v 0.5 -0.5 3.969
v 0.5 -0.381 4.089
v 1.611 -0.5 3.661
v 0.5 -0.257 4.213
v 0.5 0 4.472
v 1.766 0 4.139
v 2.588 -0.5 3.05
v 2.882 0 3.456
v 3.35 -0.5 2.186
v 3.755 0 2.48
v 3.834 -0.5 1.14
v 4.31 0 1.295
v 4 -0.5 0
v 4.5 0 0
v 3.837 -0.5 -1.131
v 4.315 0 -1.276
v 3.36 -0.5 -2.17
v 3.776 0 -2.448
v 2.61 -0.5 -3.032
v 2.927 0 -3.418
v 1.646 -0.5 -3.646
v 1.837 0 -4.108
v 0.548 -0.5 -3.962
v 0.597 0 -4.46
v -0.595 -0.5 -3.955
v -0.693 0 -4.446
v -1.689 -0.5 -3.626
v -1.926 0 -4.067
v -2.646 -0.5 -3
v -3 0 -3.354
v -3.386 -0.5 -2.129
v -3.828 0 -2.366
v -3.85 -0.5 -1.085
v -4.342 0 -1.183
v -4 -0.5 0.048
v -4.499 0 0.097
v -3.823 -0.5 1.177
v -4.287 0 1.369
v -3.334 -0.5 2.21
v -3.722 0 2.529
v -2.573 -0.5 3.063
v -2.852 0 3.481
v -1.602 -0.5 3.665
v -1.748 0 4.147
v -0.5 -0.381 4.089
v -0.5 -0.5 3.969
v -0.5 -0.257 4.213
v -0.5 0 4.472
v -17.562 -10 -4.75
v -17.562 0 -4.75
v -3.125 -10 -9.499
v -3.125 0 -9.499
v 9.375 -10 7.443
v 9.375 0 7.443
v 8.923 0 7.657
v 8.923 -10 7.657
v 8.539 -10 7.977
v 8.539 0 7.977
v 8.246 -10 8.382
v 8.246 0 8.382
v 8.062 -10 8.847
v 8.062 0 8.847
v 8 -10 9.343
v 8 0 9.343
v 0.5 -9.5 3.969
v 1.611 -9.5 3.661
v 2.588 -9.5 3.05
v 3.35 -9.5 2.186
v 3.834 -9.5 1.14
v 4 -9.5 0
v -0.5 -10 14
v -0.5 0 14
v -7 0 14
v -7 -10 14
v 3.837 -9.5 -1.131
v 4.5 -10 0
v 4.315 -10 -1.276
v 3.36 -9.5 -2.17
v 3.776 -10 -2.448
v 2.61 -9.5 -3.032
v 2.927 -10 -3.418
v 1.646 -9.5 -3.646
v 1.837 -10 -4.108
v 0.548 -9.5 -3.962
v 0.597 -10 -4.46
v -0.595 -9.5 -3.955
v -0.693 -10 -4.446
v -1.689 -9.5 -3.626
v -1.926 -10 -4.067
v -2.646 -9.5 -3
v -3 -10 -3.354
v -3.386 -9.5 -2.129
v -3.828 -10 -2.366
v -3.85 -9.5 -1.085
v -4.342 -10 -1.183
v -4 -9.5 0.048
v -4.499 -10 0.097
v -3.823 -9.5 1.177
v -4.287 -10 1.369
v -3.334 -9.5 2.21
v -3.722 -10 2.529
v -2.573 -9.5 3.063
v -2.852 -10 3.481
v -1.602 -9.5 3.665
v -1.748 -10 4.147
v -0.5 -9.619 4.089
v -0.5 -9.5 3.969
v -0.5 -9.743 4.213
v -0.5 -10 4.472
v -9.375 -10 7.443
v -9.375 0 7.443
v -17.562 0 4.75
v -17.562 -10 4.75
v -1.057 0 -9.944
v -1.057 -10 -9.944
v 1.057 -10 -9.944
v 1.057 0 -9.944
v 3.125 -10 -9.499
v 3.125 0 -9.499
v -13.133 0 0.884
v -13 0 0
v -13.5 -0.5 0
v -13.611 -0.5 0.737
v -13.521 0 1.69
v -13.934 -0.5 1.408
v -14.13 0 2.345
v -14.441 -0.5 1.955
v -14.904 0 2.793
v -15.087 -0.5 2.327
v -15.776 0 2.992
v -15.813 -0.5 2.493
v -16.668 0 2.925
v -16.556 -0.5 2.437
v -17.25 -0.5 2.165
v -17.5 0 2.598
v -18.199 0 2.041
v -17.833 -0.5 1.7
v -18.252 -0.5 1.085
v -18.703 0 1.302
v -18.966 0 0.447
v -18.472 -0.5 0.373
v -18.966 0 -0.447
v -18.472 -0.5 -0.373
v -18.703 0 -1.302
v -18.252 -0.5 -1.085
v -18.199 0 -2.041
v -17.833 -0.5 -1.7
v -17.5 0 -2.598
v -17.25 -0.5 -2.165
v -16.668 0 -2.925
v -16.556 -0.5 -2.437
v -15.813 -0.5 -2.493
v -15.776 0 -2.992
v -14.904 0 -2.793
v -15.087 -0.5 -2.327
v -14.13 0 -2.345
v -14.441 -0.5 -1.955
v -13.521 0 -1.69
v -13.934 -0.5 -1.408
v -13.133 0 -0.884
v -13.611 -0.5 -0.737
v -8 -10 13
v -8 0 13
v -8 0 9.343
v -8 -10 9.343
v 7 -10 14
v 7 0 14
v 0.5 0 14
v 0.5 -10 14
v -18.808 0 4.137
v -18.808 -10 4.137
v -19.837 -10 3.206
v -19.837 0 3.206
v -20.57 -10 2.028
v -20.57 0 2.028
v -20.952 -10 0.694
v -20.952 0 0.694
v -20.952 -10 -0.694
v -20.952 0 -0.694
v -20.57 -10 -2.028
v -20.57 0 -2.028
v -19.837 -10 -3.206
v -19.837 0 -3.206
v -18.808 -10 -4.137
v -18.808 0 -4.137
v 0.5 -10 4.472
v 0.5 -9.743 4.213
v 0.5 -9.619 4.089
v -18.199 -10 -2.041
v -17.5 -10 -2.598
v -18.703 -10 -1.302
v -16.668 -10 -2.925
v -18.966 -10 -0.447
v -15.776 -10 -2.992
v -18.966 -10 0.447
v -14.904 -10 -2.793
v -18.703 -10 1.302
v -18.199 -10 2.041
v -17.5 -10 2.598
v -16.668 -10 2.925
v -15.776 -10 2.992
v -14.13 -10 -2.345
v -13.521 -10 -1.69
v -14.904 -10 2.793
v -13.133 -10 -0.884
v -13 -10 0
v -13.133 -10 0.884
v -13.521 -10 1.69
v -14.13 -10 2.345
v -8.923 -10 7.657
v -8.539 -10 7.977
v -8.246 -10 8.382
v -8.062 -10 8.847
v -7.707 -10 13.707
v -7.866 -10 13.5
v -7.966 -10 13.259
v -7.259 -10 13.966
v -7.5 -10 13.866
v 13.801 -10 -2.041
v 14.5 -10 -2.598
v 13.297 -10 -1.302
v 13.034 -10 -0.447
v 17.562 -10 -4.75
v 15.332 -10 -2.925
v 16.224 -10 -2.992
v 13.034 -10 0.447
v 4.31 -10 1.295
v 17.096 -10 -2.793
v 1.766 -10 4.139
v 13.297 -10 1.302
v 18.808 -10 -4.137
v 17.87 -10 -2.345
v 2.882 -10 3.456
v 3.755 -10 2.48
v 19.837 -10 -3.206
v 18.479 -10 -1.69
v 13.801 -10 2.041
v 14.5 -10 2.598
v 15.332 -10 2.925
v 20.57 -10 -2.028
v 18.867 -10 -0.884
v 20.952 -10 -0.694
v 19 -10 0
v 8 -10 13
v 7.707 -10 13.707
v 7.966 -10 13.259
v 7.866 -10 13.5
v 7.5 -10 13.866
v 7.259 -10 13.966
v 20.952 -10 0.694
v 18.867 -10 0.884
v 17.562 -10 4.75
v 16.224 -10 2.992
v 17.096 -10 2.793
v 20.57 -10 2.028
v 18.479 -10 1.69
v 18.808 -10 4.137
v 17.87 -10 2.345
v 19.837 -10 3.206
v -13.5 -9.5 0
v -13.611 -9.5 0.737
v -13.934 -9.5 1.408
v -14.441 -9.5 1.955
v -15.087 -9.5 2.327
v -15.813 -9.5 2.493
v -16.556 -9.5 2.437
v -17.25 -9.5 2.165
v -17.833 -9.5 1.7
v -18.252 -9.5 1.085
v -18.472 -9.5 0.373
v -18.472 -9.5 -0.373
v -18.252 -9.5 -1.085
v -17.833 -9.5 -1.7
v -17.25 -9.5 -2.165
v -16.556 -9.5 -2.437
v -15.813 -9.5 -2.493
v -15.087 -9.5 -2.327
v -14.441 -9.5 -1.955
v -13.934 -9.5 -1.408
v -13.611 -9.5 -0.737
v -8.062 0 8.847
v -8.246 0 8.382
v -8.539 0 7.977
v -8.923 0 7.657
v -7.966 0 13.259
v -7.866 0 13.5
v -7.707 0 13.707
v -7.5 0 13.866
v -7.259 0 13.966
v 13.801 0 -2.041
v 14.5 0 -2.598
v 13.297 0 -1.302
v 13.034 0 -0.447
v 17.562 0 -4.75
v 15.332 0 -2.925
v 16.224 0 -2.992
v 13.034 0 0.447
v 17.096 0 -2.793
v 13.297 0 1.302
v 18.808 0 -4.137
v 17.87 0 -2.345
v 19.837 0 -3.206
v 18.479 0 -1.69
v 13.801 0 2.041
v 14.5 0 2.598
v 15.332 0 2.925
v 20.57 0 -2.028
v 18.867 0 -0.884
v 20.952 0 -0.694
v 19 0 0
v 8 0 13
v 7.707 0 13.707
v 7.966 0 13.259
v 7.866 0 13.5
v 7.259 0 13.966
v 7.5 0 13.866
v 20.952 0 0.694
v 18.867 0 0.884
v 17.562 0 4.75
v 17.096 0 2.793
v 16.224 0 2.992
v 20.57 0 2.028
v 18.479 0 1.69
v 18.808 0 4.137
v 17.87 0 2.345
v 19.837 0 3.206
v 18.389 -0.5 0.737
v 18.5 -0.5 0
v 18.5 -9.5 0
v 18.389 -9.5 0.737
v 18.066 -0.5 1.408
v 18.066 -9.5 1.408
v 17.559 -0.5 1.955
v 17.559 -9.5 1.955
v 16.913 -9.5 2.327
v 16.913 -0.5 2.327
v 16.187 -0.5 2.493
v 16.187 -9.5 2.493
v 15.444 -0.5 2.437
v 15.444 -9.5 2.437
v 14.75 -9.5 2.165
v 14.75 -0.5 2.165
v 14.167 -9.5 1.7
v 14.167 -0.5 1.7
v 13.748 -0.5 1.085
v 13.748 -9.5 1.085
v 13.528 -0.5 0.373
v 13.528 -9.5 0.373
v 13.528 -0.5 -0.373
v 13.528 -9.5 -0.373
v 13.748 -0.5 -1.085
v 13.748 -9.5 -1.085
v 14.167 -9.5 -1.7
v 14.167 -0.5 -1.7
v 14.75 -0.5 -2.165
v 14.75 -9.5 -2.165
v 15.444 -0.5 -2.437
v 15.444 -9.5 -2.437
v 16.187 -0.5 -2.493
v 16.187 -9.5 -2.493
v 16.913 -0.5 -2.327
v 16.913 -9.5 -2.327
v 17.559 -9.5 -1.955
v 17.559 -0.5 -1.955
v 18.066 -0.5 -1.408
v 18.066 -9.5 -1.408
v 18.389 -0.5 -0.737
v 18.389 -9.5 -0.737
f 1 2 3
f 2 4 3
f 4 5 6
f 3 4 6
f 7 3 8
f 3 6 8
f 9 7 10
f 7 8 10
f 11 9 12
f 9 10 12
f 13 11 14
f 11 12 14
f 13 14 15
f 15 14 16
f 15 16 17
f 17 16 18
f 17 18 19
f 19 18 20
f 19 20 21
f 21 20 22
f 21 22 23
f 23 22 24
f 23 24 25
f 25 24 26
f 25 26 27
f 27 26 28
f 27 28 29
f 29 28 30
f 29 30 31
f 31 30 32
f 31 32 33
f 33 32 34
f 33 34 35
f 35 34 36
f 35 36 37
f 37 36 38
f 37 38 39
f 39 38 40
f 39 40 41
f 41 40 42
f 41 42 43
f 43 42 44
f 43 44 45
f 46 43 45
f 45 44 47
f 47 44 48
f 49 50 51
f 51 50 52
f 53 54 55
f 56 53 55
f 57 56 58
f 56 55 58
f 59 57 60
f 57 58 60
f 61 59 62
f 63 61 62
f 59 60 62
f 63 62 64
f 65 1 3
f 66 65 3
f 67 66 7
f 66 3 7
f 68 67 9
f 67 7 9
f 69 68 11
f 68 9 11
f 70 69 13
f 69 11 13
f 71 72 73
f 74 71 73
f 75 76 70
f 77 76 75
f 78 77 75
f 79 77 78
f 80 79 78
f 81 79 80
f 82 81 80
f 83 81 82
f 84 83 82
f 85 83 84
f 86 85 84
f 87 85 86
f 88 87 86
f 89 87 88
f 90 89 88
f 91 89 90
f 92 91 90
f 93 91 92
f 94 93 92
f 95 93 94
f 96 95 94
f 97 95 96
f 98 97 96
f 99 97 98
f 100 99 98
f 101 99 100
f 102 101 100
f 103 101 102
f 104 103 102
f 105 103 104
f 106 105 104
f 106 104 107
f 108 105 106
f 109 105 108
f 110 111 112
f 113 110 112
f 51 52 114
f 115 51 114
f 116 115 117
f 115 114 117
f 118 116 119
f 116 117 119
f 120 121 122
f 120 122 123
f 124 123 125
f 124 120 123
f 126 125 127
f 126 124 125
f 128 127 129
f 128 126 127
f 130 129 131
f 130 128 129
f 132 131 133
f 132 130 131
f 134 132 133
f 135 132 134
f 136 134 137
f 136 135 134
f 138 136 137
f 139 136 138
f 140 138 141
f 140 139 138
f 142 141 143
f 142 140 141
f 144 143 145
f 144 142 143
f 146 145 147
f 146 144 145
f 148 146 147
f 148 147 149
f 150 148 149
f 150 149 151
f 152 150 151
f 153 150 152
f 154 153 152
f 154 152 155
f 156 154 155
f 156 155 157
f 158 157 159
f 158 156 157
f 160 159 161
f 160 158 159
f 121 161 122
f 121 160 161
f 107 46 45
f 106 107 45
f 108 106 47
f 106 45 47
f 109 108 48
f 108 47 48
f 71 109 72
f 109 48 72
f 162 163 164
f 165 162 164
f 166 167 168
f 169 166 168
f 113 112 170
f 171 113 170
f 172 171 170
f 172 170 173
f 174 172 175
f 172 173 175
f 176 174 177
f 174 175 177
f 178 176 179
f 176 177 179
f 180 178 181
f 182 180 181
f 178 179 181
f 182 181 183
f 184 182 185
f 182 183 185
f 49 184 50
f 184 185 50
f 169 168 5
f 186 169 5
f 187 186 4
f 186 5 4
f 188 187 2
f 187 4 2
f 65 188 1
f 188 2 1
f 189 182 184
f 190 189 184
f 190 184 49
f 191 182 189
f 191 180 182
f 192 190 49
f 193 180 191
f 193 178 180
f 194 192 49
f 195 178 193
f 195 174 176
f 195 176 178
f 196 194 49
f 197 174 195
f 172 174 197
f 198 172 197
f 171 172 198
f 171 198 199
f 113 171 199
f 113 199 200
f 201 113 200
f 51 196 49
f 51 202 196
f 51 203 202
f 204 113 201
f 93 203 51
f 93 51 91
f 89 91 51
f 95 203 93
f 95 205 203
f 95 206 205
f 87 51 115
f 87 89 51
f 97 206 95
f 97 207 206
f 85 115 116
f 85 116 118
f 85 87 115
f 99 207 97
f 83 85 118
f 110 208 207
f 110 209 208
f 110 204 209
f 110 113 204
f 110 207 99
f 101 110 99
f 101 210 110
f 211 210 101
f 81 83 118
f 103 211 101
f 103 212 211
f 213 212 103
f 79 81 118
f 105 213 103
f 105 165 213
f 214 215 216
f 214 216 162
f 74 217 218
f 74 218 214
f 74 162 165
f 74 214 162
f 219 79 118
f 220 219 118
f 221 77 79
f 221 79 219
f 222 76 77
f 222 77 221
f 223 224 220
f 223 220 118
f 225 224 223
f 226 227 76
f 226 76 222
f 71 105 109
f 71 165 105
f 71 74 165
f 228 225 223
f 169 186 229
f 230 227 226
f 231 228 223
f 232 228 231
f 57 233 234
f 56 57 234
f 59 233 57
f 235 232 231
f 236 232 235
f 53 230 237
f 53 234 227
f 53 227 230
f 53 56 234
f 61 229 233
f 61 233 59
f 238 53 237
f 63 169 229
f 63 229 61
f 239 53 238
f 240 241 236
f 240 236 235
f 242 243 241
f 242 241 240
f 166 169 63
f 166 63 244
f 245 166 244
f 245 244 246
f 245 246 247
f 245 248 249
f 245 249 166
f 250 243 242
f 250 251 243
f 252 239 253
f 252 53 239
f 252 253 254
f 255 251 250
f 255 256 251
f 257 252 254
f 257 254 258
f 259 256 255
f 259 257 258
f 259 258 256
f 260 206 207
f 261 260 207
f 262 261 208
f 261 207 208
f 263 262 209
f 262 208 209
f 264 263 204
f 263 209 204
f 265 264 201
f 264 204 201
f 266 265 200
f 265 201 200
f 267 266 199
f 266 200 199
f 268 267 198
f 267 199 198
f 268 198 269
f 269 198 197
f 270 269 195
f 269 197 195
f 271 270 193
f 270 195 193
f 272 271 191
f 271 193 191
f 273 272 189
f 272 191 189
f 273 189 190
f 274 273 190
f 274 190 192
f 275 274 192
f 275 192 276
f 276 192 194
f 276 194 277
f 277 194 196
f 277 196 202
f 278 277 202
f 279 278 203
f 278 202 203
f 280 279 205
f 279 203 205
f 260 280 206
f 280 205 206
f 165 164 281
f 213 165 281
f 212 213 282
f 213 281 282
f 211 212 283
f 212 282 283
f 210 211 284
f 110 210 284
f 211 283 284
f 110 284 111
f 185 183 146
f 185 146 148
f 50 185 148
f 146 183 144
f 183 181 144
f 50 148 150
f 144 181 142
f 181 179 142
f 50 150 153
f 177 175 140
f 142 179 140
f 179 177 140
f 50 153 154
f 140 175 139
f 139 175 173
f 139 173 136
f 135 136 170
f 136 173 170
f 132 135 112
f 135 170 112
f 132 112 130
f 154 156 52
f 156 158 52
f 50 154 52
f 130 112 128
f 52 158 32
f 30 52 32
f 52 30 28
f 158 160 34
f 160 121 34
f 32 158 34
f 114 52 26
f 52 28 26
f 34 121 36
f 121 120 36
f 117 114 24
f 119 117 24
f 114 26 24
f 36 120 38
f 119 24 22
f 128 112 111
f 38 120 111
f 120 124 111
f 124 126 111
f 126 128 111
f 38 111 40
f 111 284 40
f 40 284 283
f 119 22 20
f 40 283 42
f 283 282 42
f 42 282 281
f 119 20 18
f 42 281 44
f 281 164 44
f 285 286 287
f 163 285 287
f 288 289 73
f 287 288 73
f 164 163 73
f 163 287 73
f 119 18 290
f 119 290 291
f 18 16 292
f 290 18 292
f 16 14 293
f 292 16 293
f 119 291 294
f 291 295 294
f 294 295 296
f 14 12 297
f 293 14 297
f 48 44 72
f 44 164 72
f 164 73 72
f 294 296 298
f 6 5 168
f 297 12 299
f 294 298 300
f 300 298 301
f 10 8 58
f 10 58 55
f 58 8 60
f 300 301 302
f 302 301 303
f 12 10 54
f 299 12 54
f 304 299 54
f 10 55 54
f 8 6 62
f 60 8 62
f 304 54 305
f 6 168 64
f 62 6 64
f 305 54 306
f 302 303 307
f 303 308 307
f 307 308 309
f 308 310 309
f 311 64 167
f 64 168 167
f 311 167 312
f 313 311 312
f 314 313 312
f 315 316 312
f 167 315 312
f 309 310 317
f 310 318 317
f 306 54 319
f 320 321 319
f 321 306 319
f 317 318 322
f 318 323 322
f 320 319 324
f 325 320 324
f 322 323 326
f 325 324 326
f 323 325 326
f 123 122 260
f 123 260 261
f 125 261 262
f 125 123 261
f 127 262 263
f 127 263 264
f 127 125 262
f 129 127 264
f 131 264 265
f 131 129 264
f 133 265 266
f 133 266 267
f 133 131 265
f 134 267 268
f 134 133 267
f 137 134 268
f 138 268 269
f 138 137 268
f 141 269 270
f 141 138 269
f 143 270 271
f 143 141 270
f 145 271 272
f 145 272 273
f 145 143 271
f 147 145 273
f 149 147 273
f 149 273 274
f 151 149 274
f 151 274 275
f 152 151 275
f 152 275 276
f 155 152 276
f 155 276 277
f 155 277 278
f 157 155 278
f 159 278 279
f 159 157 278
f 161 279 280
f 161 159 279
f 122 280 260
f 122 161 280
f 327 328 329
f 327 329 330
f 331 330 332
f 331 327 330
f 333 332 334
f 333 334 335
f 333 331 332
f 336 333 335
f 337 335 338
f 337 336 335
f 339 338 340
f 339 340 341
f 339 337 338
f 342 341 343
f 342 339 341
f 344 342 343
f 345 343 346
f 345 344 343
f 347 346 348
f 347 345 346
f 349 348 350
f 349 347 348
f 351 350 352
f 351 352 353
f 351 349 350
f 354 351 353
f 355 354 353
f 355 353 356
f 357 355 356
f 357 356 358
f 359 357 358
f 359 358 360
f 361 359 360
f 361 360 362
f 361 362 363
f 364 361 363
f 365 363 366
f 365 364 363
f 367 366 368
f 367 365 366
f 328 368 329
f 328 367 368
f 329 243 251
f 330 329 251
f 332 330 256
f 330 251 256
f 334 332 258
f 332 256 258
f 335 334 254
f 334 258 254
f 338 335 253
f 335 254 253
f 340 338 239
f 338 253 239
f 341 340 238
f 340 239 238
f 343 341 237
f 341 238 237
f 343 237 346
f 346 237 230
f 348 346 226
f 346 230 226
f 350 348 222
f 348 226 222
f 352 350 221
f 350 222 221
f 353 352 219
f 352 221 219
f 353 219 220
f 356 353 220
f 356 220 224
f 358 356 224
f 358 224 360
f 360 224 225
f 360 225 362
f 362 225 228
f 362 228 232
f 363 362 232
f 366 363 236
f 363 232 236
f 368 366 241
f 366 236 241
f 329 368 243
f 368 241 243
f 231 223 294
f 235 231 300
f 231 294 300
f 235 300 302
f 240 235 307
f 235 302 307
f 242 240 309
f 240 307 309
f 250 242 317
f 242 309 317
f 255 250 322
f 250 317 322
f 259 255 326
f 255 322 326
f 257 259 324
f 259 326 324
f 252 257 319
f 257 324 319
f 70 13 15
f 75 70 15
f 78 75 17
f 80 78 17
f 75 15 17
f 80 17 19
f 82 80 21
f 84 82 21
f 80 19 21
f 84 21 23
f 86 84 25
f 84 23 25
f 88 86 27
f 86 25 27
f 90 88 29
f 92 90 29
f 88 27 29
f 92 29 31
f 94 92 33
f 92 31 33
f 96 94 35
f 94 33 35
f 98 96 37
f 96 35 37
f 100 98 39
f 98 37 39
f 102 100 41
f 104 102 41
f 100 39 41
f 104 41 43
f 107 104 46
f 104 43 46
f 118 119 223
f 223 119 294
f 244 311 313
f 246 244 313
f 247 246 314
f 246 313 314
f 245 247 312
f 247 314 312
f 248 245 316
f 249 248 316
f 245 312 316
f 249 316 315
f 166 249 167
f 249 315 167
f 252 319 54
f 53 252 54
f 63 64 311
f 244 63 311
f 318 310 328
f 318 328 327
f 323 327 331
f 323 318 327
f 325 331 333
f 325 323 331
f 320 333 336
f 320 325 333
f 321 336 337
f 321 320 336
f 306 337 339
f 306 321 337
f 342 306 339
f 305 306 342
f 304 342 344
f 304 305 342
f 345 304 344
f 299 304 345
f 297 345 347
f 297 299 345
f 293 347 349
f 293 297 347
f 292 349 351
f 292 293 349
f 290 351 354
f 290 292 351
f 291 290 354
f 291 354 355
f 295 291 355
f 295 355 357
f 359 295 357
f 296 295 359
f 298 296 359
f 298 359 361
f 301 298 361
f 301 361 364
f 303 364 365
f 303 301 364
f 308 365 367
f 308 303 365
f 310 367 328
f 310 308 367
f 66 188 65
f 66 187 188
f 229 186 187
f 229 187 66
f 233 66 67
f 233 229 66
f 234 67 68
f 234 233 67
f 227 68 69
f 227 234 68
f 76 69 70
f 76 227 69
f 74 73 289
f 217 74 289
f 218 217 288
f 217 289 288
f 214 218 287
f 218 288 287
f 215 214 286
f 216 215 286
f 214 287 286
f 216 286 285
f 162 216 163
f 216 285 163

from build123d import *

# Parameters (mm, degrees)
F0_R     = 2.5
F1_DEPTH = 10
F2_SIZE  = 0.5


# Not quite as in the source:
# - a feature names something its author has since deleted; it is built from what else it names


with BuildPart() as f1:
    # F0 (on Front) → F1 (new body)
    with BuildSketch(Plane.XZ):
        with BuildLine():
            Line((0.5, 14), (0.5, 9.9874921777))
            ThreePointArc((0.5, 9.9874921777), (7.2456883731, 6.892024376), (10, 0))
            ThreePointArc((10, 0), (8.100925873, -5.8630196998), (3.125, -9.499177596))
            Line((3.125, -9.499177596), (17.5625, -4.749588798))
            ThreePointArc((17.5625, -4.749588798), (11, 0), (17.5625, 4.749588798))
            Line((17.5625, 4.749588798), (9.375, 7.4430785492))
            ThreePointArc((9.375, 7.4430785492), (8.3798148254, 8.1703101285), (8, 9.3429140684))
            Line((8, 9.3429140684), (8, 13))
            ThreePointArc((8, 13), (7.7071067812, 13.7071067812), (7, 14))
            Line((7, 14), (0.5, 14))
        make_face()
        with BuildLine():
            ThreePointArc((17.5625, 4.749588798), (11, 0), (17.5625, -4.749588798))
            ThreePointArc((17.5625, -4.749588798), (20.0504629365, -2.9315098499), (21, 0))
            ThreePointArc((21, 0), (20.0504629365, 2.9315098499), (17.5625, 4.749588798))
        make_face()
        with Locations((16, 0)):
            Circle(F0_R, mode=Mode.SUBTRACT)
        with BuildLine():
            ThreePointArc((-3.125, -9.499177596), (-9.9104859097, 1.3350164915), (-0.5, 9.9874921777))
            Line((-0.5, 9.9874921777), (-0.5, 14))
            Line((-0.5, 14), (-7, 14))
            ThreePointArc((-7, 14), (-7.7071067812, 13.7071067812), (-8, 13))
            Line((-8, 13), (-8, 9.3429140684))
            ThreePointArc((-8, 9.3429140684), (-8.3798148254, 8.1703101285), (-9.375, 7.4430785492))
            Line((-9.375, 7.4430785492), (-17.5625, 4.749588798))
            ThreePointArc((-17.5625, 4.749588798), (-13.0684901501, 4.0504629365), (-11, 0))
            ThreePointArc((-11, 0), (-13.0684901501, -4.0504629365), (-17.5625, -4.749588798))
            Line((-17.5625, -4.749588798), (-3.125, -9.499177596))
        make_face()
        with BuildLine():
            ThreePointArc((-17.5625, 4.749588798), (-21, 0), (-17.5625, -4.749588798))
            ThreePointArc((-17.5625, -4.749588798), (-13.0684901501, -4.0504629365), (-11, 0))
            ThreePointArc((-11, 0), (-13.0684901501, 4.0504629365), (-17.5625, 4.749588798))
        make_face()
        with Locations((-16, 0)):
            Circle(F0_R, mode=Mode.SUBTRACT)
        with BuildLine():
            ThreePointArc((0.5, 3.9686269666), (3, 2.6457513111), (4, 0))
            ThreePointArc((4, 0), (-2.6457513111, -3), (-0.5, 3.9686269666))
            Line((-0.5, 3.9686269666), (-0.5, 9.9874921777))
            ThreePointArc((-0.5, 9.9874921777), (-9.9104859097, 1.3350164915), (-3.125, -9.499177596))
            ThreePointArc((-3.125, -9.499177596), (0, -10), (3.125, -9.499177596))
            ThreePointArc((3.125, -9.499177596), (8.100925873, -5.8630196998), (10, 0))
            ThreePointArc((10, 0), (7.2456883731, 6.892024376), (0.5, 9.9874921777))
            Line((0.5, 9.9874921777), (0.5, 3.9686269666))
        make_face()
    extrude(amount=F1_DEPTH)

    # F2
    f2_edges = [f1.edges().sort_by_distance(p)[0] for p in [
        (-18.5, -10, 0),
        (0, -10, -4),
        (13.5, -10, 0),
        (13.5, 0, 0),
        (0, 0, -4),
        (-18.5, 0, 0),
    ]]
    chamfer(f2_edges, length=F2_SIZE)


solid = f1.part
